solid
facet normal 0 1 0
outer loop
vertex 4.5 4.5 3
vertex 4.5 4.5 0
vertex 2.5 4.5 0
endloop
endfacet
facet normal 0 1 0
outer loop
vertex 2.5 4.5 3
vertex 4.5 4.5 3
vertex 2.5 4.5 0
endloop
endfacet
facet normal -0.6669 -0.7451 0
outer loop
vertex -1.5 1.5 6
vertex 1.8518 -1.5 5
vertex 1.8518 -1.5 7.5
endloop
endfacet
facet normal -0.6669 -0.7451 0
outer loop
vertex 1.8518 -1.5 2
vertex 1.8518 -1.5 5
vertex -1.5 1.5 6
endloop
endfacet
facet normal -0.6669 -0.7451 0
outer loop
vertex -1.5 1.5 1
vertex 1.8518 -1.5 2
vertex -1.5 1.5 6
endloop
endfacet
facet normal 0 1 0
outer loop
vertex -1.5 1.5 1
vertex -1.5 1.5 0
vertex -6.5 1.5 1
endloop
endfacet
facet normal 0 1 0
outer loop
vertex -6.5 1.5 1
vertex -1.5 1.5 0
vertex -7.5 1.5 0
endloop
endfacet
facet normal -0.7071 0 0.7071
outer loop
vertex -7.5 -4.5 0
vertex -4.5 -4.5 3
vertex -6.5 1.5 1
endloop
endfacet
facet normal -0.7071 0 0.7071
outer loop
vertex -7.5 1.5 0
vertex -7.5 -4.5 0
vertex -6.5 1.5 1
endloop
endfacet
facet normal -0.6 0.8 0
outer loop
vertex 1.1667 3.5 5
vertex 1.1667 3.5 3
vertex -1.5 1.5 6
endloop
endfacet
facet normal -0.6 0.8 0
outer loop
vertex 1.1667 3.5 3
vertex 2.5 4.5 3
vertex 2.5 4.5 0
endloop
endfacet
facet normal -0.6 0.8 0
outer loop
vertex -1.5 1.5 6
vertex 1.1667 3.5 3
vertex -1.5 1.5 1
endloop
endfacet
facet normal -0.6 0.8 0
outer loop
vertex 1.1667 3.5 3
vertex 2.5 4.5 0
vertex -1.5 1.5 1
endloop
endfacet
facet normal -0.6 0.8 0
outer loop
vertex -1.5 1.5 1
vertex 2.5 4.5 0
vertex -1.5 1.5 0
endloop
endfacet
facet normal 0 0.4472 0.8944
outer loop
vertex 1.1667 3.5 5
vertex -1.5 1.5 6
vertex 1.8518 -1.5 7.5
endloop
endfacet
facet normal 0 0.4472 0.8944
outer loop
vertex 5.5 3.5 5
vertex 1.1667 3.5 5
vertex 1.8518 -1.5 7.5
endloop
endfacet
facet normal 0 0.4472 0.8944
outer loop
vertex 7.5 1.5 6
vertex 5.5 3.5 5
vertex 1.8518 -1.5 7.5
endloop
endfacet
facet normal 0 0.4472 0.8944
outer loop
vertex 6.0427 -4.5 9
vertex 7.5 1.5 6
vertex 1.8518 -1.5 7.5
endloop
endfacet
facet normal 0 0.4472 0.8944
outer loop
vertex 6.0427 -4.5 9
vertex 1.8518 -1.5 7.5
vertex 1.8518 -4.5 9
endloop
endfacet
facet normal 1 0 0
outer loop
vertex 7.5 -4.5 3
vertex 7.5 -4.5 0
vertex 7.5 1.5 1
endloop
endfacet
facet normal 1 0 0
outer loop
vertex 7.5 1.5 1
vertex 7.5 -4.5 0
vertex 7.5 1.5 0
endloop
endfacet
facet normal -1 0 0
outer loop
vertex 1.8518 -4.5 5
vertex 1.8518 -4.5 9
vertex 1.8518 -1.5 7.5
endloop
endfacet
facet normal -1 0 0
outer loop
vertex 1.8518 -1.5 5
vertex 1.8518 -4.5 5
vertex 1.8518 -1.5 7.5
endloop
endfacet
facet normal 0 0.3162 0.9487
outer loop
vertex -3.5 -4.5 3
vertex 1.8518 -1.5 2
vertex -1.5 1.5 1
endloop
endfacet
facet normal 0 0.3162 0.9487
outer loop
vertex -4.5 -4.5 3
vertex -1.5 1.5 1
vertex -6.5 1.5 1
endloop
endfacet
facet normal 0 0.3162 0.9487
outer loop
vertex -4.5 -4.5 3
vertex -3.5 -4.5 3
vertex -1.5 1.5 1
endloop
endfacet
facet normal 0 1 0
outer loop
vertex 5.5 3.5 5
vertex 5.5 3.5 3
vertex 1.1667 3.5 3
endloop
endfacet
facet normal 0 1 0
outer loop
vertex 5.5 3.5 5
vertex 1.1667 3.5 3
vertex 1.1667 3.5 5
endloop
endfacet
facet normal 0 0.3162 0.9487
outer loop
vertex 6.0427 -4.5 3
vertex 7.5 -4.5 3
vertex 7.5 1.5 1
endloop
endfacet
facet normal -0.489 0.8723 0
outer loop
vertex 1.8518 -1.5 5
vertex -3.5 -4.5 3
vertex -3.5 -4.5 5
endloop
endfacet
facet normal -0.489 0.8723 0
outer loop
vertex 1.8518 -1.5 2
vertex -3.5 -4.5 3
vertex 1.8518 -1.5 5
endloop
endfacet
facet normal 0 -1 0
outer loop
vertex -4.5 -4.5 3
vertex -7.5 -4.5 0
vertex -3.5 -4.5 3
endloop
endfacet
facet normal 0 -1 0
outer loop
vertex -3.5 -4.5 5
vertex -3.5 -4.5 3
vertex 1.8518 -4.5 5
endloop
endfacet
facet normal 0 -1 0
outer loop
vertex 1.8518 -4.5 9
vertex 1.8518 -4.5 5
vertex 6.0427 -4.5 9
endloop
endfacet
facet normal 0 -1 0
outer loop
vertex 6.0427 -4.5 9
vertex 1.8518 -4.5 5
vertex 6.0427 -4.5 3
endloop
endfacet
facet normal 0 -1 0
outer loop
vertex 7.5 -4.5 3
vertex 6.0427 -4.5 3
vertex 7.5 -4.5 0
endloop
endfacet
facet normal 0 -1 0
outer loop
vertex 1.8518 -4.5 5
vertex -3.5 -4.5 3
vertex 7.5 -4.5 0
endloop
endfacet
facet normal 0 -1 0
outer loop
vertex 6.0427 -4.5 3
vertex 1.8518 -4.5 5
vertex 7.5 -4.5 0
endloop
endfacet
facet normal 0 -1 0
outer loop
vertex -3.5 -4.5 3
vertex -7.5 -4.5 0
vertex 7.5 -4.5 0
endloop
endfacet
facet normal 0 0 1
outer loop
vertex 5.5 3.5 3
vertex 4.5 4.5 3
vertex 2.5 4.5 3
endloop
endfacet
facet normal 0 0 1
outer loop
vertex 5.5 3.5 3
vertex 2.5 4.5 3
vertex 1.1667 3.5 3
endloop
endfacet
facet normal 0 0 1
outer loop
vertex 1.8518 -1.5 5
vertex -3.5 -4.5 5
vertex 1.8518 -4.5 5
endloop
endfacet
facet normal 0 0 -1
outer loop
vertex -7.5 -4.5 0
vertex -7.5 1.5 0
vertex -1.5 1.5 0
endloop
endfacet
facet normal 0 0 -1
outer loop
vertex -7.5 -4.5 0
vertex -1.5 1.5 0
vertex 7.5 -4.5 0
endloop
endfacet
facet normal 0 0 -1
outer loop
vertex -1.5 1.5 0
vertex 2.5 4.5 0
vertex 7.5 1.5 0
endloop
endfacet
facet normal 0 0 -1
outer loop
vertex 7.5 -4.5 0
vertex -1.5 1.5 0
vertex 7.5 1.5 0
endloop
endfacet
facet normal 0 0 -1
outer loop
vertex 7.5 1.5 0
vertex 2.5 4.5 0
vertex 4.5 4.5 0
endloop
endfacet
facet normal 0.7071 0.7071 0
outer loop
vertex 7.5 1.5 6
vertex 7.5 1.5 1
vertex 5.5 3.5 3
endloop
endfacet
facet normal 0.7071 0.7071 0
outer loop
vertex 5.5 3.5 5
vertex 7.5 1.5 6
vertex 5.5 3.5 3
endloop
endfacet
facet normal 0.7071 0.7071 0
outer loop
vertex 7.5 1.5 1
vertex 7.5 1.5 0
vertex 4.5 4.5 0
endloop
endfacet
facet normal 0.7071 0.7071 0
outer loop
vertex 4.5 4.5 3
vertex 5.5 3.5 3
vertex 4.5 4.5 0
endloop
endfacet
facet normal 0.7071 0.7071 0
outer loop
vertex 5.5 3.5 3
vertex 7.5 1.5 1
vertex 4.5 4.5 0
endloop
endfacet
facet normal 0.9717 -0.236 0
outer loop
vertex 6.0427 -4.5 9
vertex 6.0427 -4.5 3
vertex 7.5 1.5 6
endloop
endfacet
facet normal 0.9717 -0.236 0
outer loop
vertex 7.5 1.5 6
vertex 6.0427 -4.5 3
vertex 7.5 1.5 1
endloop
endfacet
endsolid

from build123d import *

# Parameters (mm, degrees)
BOSS_EXTRUDE1_DEPTH = 9
CUT_EXTRUDE1_DEPTH  = 19
CUT_EXTRUDE2_DEPTH  = 10
CUT_EXTRUDE3_DEPTH  = 10
CUT_EXTRUDE4_DEPTH  = 10
CUT_EXTRUDE6_DEPTH  = 5


with BuildPart() as part:
    # Sketch1 → Boss-Extrude1 (new body)
    with BuildSketch(Plane.XY):
        Polygon((7.5, 1.5), (4.5, 4.5), (2.5, 4.5), (-1.5, 1.5), (-7.5, 1.5), (-7.5, -4.5), (7.5, -4.5), align=None)
    extrude(amount=BOSS_EXTRUDE1_DEPTH)

    # Sketch2 → Cut-Extrude1 (cut)
    with BuildSketch(Plane.ZY.offset(7.5)):
        Polygon((3, 4.5), (3, 3.5), (5, 3.5), (9, -4.5), (9, 4.5), align=None)
    extrude(amount=-CUT_EXTRUDE1_DEPTH, mode=Mode.SUBTRACT)

    # 3DSketch1 → Cut-Extrude2 (cut, along a direction that is not the sketch's normal)
    with BuildSketch(Plane(origin=(-7.5, 1.5, 0), x_dir=(0.4082482904638631, -0.816496580927726, 0.4082482904638631), z_dir=(0.7071067811865476, 0, -0.7071067811865476))):
        Polygon((0, 0), (4.898979486, 3.464101615), (7.348469228, 0), (0.816496581, -1.154700538), align=None)
    extrude(amount=-CUT_EXTRUDE2_DEPTH, dir=(1, 0, 0), mode=Mode.SUBTRACT)

    # 3DSketch2 → Cut-Extrude3 (cut, along a direction that is not the sketch's normal)
    with BuildSketch(Plane(origin=(-6.5, 1.5, 1), x_dir=(0.9352065538199315, -0.3359312898838437, 0.11197709662794787), z_dir=(0, -0.31622776601683794, -0.9486832980505139))):
        Polygon((0, 0), (4.10995504, 5.206560243), (5.045161594, 4.852457572), (8.930397645, 0), (4.676032769, -1.770513356), align=None)
    extrude(amount=-CUT_EXTRUDE3_DEPTH, dir=(0, 0, -1), mode=Mode.SUBTRACT)


with BuildPart() as body_2:
    # of the pieces the cut leaves, the one that is kept (cut_extrude3_keep)
    add(part.part.solids().sort_by_distance((7.5, 1.5, 0))[0])

    # 3DSketch3 → Cut-Extrude4 (cut, along a direction that is not the sketch's normal)
    with BuildSketch(Plane(origin=(7.5, 1.5, 1), x_dir=(-0.22453265936457553, -0.9244601540308832, 0.3081533846769612), z_dir=(0, 0.316227766016838, 0.9486832980505139))):
        Polygon((0, 0), (6.163067694, 1.420069225), (6.490274323, 0), align=None)
    extrude(amount=CUT_EXTRUDE4_DEPTH, dir=(0, 0, 1), mode=Mode.SUBTRACT)

    # Sketch4 → Cut-Extrude6 (cut)
    with BuildSketch(Plane.XY.offset(10)):
        Polygon((1.851766406, -4.5), (1.851766406, -1.5), (-3.5, -4.5), align=None)
    extrude(amount=-CUT_EXTRUDE6_DEPTH, mode=Mode.SUBTRACT)


solid = body_2.part
